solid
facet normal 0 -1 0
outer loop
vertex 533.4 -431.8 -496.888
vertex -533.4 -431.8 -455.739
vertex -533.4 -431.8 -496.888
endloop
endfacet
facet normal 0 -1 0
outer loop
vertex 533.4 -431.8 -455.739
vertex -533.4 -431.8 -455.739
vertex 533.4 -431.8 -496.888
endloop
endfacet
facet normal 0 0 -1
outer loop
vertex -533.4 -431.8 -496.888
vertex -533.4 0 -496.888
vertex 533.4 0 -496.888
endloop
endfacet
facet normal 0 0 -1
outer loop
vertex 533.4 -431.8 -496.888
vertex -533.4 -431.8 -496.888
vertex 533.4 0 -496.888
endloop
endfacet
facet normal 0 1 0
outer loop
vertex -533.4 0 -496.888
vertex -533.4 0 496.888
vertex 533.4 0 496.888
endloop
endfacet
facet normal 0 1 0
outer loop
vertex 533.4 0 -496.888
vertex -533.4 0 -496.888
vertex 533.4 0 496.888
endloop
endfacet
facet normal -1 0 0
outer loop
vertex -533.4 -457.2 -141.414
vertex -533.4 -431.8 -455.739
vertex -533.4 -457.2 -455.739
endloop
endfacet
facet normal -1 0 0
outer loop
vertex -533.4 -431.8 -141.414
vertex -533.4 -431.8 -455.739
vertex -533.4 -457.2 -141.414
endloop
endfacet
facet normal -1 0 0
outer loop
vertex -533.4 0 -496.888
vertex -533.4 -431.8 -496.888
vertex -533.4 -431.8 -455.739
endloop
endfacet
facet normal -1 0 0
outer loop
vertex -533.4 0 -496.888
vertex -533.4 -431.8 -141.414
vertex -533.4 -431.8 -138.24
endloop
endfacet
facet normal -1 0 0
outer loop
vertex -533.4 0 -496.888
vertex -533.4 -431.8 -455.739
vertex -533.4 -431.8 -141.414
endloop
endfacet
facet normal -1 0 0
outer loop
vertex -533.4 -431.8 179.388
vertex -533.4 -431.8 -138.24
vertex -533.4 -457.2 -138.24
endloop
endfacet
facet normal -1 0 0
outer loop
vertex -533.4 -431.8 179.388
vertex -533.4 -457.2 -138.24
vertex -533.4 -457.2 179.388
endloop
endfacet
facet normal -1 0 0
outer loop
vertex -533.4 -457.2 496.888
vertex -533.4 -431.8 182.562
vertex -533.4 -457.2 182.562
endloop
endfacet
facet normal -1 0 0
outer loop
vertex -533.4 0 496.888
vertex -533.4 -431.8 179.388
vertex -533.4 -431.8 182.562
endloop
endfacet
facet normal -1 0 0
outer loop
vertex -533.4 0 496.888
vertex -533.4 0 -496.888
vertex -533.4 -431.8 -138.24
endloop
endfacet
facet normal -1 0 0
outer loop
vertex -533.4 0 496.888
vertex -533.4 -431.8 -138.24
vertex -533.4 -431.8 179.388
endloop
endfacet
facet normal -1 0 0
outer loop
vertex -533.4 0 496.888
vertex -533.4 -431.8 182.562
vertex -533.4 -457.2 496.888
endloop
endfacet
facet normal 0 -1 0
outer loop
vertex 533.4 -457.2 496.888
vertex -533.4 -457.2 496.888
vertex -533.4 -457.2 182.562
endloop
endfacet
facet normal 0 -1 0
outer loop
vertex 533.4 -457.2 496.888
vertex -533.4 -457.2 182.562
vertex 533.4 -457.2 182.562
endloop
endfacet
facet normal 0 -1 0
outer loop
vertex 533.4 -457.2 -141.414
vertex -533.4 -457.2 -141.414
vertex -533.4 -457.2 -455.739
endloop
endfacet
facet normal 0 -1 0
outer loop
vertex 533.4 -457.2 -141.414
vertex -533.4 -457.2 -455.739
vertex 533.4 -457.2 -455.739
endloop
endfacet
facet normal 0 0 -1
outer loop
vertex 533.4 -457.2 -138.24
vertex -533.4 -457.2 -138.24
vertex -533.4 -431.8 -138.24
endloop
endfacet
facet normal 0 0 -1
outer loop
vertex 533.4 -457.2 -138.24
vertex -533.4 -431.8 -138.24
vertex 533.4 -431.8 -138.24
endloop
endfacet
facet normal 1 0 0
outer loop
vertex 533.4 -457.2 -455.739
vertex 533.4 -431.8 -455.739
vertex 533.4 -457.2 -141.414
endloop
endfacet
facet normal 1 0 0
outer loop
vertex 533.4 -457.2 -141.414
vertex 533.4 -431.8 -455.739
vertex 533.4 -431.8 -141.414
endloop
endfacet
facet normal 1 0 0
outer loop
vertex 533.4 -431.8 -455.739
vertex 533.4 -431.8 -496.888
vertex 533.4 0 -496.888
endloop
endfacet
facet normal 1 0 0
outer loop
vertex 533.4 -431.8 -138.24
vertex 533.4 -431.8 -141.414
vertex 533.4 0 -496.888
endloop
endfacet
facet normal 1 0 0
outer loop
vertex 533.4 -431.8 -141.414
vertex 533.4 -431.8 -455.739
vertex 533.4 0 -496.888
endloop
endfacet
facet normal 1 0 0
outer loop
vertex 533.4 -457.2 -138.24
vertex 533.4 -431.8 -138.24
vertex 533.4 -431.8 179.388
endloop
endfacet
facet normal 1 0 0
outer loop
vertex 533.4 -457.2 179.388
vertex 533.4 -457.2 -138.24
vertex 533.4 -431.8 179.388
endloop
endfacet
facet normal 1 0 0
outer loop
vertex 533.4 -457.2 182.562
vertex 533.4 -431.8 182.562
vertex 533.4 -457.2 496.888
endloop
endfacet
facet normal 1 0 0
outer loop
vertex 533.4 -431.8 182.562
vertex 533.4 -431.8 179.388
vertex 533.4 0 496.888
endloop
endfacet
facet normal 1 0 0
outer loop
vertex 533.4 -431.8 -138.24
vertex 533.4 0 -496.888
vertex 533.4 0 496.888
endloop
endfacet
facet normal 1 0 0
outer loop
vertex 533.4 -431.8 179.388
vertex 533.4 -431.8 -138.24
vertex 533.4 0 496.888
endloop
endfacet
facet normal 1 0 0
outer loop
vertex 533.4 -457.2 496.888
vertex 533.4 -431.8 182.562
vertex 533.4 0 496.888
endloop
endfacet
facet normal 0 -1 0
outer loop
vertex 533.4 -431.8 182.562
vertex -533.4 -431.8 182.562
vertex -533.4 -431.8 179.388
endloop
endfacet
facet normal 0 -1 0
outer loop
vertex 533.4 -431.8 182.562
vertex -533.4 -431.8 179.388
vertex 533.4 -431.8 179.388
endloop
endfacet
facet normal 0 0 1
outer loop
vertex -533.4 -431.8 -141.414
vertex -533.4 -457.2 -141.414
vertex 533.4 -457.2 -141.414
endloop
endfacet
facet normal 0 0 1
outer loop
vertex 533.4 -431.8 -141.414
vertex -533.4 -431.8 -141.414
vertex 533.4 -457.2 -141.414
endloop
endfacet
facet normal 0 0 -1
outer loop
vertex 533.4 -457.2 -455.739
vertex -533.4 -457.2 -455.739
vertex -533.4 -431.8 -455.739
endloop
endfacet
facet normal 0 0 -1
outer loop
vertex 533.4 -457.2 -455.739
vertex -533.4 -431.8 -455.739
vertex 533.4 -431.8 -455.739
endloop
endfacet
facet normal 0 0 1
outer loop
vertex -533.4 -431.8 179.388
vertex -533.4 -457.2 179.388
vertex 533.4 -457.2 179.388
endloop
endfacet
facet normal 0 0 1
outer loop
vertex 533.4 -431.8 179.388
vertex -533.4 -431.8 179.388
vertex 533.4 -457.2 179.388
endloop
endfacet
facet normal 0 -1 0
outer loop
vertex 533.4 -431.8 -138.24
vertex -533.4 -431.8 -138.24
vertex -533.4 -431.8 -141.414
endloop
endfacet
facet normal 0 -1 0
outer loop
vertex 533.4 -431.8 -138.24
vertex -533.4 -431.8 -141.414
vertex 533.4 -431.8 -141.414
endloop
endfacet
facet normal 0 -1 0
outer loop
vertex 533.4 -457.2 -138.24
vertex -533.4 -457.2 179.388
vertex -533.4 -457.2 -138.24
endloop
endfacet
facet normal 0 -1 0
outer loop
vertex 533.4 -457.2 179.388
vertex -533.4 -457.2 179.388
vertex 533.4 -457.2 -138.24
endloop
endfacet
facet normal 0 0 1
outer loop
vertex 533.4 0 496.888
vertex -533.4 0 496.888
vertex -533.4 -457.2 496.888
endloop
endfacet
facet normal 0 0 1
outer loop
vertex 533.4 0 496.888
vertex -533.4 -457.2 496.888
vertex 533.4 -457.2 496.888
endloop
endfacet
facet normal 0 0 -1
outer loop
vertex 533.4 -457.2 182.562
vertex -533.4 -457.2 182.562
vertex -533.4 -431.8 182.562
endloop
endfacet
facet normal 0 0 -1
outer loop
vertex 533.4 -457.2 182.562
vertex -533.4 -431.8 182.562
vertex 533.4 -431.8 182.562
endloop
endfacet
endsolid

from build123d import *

# Parameters (mm, degrees)
F0_W     = 1066.8
F0_H     = 993.775
F1_DEPTH = 457.2
F2_W     = 1066.8
F2_H     = 3.175
F2_H_2   = 41.148
F3_DEPTH = 25.4


with BuildPart() as f1:
    # F0 (on Front) → F1 (new body)
    with BuildSketch(Plane.XZ):
        Rectangle(F0_W, F0_H)
    extrude(amount=F1_DEPTH)

    # F2 (on face) → F3 (cut)
    with BuildSketch(Plane.XZ.offset(457.2)):
        with Locations((0, 180.975)):
            Rectangle(F2_W, F2_H)
        with Locations((0, -139.827)):
            Rectangle(F2_W, F2_H)
        with Locations((0, -476.3135)):
            Rectangle(F2_W, F2_H_2)
    extrude(amount=-F3_DEPTH, mode=Mode.SUBTRACT)


solid = f1.part
